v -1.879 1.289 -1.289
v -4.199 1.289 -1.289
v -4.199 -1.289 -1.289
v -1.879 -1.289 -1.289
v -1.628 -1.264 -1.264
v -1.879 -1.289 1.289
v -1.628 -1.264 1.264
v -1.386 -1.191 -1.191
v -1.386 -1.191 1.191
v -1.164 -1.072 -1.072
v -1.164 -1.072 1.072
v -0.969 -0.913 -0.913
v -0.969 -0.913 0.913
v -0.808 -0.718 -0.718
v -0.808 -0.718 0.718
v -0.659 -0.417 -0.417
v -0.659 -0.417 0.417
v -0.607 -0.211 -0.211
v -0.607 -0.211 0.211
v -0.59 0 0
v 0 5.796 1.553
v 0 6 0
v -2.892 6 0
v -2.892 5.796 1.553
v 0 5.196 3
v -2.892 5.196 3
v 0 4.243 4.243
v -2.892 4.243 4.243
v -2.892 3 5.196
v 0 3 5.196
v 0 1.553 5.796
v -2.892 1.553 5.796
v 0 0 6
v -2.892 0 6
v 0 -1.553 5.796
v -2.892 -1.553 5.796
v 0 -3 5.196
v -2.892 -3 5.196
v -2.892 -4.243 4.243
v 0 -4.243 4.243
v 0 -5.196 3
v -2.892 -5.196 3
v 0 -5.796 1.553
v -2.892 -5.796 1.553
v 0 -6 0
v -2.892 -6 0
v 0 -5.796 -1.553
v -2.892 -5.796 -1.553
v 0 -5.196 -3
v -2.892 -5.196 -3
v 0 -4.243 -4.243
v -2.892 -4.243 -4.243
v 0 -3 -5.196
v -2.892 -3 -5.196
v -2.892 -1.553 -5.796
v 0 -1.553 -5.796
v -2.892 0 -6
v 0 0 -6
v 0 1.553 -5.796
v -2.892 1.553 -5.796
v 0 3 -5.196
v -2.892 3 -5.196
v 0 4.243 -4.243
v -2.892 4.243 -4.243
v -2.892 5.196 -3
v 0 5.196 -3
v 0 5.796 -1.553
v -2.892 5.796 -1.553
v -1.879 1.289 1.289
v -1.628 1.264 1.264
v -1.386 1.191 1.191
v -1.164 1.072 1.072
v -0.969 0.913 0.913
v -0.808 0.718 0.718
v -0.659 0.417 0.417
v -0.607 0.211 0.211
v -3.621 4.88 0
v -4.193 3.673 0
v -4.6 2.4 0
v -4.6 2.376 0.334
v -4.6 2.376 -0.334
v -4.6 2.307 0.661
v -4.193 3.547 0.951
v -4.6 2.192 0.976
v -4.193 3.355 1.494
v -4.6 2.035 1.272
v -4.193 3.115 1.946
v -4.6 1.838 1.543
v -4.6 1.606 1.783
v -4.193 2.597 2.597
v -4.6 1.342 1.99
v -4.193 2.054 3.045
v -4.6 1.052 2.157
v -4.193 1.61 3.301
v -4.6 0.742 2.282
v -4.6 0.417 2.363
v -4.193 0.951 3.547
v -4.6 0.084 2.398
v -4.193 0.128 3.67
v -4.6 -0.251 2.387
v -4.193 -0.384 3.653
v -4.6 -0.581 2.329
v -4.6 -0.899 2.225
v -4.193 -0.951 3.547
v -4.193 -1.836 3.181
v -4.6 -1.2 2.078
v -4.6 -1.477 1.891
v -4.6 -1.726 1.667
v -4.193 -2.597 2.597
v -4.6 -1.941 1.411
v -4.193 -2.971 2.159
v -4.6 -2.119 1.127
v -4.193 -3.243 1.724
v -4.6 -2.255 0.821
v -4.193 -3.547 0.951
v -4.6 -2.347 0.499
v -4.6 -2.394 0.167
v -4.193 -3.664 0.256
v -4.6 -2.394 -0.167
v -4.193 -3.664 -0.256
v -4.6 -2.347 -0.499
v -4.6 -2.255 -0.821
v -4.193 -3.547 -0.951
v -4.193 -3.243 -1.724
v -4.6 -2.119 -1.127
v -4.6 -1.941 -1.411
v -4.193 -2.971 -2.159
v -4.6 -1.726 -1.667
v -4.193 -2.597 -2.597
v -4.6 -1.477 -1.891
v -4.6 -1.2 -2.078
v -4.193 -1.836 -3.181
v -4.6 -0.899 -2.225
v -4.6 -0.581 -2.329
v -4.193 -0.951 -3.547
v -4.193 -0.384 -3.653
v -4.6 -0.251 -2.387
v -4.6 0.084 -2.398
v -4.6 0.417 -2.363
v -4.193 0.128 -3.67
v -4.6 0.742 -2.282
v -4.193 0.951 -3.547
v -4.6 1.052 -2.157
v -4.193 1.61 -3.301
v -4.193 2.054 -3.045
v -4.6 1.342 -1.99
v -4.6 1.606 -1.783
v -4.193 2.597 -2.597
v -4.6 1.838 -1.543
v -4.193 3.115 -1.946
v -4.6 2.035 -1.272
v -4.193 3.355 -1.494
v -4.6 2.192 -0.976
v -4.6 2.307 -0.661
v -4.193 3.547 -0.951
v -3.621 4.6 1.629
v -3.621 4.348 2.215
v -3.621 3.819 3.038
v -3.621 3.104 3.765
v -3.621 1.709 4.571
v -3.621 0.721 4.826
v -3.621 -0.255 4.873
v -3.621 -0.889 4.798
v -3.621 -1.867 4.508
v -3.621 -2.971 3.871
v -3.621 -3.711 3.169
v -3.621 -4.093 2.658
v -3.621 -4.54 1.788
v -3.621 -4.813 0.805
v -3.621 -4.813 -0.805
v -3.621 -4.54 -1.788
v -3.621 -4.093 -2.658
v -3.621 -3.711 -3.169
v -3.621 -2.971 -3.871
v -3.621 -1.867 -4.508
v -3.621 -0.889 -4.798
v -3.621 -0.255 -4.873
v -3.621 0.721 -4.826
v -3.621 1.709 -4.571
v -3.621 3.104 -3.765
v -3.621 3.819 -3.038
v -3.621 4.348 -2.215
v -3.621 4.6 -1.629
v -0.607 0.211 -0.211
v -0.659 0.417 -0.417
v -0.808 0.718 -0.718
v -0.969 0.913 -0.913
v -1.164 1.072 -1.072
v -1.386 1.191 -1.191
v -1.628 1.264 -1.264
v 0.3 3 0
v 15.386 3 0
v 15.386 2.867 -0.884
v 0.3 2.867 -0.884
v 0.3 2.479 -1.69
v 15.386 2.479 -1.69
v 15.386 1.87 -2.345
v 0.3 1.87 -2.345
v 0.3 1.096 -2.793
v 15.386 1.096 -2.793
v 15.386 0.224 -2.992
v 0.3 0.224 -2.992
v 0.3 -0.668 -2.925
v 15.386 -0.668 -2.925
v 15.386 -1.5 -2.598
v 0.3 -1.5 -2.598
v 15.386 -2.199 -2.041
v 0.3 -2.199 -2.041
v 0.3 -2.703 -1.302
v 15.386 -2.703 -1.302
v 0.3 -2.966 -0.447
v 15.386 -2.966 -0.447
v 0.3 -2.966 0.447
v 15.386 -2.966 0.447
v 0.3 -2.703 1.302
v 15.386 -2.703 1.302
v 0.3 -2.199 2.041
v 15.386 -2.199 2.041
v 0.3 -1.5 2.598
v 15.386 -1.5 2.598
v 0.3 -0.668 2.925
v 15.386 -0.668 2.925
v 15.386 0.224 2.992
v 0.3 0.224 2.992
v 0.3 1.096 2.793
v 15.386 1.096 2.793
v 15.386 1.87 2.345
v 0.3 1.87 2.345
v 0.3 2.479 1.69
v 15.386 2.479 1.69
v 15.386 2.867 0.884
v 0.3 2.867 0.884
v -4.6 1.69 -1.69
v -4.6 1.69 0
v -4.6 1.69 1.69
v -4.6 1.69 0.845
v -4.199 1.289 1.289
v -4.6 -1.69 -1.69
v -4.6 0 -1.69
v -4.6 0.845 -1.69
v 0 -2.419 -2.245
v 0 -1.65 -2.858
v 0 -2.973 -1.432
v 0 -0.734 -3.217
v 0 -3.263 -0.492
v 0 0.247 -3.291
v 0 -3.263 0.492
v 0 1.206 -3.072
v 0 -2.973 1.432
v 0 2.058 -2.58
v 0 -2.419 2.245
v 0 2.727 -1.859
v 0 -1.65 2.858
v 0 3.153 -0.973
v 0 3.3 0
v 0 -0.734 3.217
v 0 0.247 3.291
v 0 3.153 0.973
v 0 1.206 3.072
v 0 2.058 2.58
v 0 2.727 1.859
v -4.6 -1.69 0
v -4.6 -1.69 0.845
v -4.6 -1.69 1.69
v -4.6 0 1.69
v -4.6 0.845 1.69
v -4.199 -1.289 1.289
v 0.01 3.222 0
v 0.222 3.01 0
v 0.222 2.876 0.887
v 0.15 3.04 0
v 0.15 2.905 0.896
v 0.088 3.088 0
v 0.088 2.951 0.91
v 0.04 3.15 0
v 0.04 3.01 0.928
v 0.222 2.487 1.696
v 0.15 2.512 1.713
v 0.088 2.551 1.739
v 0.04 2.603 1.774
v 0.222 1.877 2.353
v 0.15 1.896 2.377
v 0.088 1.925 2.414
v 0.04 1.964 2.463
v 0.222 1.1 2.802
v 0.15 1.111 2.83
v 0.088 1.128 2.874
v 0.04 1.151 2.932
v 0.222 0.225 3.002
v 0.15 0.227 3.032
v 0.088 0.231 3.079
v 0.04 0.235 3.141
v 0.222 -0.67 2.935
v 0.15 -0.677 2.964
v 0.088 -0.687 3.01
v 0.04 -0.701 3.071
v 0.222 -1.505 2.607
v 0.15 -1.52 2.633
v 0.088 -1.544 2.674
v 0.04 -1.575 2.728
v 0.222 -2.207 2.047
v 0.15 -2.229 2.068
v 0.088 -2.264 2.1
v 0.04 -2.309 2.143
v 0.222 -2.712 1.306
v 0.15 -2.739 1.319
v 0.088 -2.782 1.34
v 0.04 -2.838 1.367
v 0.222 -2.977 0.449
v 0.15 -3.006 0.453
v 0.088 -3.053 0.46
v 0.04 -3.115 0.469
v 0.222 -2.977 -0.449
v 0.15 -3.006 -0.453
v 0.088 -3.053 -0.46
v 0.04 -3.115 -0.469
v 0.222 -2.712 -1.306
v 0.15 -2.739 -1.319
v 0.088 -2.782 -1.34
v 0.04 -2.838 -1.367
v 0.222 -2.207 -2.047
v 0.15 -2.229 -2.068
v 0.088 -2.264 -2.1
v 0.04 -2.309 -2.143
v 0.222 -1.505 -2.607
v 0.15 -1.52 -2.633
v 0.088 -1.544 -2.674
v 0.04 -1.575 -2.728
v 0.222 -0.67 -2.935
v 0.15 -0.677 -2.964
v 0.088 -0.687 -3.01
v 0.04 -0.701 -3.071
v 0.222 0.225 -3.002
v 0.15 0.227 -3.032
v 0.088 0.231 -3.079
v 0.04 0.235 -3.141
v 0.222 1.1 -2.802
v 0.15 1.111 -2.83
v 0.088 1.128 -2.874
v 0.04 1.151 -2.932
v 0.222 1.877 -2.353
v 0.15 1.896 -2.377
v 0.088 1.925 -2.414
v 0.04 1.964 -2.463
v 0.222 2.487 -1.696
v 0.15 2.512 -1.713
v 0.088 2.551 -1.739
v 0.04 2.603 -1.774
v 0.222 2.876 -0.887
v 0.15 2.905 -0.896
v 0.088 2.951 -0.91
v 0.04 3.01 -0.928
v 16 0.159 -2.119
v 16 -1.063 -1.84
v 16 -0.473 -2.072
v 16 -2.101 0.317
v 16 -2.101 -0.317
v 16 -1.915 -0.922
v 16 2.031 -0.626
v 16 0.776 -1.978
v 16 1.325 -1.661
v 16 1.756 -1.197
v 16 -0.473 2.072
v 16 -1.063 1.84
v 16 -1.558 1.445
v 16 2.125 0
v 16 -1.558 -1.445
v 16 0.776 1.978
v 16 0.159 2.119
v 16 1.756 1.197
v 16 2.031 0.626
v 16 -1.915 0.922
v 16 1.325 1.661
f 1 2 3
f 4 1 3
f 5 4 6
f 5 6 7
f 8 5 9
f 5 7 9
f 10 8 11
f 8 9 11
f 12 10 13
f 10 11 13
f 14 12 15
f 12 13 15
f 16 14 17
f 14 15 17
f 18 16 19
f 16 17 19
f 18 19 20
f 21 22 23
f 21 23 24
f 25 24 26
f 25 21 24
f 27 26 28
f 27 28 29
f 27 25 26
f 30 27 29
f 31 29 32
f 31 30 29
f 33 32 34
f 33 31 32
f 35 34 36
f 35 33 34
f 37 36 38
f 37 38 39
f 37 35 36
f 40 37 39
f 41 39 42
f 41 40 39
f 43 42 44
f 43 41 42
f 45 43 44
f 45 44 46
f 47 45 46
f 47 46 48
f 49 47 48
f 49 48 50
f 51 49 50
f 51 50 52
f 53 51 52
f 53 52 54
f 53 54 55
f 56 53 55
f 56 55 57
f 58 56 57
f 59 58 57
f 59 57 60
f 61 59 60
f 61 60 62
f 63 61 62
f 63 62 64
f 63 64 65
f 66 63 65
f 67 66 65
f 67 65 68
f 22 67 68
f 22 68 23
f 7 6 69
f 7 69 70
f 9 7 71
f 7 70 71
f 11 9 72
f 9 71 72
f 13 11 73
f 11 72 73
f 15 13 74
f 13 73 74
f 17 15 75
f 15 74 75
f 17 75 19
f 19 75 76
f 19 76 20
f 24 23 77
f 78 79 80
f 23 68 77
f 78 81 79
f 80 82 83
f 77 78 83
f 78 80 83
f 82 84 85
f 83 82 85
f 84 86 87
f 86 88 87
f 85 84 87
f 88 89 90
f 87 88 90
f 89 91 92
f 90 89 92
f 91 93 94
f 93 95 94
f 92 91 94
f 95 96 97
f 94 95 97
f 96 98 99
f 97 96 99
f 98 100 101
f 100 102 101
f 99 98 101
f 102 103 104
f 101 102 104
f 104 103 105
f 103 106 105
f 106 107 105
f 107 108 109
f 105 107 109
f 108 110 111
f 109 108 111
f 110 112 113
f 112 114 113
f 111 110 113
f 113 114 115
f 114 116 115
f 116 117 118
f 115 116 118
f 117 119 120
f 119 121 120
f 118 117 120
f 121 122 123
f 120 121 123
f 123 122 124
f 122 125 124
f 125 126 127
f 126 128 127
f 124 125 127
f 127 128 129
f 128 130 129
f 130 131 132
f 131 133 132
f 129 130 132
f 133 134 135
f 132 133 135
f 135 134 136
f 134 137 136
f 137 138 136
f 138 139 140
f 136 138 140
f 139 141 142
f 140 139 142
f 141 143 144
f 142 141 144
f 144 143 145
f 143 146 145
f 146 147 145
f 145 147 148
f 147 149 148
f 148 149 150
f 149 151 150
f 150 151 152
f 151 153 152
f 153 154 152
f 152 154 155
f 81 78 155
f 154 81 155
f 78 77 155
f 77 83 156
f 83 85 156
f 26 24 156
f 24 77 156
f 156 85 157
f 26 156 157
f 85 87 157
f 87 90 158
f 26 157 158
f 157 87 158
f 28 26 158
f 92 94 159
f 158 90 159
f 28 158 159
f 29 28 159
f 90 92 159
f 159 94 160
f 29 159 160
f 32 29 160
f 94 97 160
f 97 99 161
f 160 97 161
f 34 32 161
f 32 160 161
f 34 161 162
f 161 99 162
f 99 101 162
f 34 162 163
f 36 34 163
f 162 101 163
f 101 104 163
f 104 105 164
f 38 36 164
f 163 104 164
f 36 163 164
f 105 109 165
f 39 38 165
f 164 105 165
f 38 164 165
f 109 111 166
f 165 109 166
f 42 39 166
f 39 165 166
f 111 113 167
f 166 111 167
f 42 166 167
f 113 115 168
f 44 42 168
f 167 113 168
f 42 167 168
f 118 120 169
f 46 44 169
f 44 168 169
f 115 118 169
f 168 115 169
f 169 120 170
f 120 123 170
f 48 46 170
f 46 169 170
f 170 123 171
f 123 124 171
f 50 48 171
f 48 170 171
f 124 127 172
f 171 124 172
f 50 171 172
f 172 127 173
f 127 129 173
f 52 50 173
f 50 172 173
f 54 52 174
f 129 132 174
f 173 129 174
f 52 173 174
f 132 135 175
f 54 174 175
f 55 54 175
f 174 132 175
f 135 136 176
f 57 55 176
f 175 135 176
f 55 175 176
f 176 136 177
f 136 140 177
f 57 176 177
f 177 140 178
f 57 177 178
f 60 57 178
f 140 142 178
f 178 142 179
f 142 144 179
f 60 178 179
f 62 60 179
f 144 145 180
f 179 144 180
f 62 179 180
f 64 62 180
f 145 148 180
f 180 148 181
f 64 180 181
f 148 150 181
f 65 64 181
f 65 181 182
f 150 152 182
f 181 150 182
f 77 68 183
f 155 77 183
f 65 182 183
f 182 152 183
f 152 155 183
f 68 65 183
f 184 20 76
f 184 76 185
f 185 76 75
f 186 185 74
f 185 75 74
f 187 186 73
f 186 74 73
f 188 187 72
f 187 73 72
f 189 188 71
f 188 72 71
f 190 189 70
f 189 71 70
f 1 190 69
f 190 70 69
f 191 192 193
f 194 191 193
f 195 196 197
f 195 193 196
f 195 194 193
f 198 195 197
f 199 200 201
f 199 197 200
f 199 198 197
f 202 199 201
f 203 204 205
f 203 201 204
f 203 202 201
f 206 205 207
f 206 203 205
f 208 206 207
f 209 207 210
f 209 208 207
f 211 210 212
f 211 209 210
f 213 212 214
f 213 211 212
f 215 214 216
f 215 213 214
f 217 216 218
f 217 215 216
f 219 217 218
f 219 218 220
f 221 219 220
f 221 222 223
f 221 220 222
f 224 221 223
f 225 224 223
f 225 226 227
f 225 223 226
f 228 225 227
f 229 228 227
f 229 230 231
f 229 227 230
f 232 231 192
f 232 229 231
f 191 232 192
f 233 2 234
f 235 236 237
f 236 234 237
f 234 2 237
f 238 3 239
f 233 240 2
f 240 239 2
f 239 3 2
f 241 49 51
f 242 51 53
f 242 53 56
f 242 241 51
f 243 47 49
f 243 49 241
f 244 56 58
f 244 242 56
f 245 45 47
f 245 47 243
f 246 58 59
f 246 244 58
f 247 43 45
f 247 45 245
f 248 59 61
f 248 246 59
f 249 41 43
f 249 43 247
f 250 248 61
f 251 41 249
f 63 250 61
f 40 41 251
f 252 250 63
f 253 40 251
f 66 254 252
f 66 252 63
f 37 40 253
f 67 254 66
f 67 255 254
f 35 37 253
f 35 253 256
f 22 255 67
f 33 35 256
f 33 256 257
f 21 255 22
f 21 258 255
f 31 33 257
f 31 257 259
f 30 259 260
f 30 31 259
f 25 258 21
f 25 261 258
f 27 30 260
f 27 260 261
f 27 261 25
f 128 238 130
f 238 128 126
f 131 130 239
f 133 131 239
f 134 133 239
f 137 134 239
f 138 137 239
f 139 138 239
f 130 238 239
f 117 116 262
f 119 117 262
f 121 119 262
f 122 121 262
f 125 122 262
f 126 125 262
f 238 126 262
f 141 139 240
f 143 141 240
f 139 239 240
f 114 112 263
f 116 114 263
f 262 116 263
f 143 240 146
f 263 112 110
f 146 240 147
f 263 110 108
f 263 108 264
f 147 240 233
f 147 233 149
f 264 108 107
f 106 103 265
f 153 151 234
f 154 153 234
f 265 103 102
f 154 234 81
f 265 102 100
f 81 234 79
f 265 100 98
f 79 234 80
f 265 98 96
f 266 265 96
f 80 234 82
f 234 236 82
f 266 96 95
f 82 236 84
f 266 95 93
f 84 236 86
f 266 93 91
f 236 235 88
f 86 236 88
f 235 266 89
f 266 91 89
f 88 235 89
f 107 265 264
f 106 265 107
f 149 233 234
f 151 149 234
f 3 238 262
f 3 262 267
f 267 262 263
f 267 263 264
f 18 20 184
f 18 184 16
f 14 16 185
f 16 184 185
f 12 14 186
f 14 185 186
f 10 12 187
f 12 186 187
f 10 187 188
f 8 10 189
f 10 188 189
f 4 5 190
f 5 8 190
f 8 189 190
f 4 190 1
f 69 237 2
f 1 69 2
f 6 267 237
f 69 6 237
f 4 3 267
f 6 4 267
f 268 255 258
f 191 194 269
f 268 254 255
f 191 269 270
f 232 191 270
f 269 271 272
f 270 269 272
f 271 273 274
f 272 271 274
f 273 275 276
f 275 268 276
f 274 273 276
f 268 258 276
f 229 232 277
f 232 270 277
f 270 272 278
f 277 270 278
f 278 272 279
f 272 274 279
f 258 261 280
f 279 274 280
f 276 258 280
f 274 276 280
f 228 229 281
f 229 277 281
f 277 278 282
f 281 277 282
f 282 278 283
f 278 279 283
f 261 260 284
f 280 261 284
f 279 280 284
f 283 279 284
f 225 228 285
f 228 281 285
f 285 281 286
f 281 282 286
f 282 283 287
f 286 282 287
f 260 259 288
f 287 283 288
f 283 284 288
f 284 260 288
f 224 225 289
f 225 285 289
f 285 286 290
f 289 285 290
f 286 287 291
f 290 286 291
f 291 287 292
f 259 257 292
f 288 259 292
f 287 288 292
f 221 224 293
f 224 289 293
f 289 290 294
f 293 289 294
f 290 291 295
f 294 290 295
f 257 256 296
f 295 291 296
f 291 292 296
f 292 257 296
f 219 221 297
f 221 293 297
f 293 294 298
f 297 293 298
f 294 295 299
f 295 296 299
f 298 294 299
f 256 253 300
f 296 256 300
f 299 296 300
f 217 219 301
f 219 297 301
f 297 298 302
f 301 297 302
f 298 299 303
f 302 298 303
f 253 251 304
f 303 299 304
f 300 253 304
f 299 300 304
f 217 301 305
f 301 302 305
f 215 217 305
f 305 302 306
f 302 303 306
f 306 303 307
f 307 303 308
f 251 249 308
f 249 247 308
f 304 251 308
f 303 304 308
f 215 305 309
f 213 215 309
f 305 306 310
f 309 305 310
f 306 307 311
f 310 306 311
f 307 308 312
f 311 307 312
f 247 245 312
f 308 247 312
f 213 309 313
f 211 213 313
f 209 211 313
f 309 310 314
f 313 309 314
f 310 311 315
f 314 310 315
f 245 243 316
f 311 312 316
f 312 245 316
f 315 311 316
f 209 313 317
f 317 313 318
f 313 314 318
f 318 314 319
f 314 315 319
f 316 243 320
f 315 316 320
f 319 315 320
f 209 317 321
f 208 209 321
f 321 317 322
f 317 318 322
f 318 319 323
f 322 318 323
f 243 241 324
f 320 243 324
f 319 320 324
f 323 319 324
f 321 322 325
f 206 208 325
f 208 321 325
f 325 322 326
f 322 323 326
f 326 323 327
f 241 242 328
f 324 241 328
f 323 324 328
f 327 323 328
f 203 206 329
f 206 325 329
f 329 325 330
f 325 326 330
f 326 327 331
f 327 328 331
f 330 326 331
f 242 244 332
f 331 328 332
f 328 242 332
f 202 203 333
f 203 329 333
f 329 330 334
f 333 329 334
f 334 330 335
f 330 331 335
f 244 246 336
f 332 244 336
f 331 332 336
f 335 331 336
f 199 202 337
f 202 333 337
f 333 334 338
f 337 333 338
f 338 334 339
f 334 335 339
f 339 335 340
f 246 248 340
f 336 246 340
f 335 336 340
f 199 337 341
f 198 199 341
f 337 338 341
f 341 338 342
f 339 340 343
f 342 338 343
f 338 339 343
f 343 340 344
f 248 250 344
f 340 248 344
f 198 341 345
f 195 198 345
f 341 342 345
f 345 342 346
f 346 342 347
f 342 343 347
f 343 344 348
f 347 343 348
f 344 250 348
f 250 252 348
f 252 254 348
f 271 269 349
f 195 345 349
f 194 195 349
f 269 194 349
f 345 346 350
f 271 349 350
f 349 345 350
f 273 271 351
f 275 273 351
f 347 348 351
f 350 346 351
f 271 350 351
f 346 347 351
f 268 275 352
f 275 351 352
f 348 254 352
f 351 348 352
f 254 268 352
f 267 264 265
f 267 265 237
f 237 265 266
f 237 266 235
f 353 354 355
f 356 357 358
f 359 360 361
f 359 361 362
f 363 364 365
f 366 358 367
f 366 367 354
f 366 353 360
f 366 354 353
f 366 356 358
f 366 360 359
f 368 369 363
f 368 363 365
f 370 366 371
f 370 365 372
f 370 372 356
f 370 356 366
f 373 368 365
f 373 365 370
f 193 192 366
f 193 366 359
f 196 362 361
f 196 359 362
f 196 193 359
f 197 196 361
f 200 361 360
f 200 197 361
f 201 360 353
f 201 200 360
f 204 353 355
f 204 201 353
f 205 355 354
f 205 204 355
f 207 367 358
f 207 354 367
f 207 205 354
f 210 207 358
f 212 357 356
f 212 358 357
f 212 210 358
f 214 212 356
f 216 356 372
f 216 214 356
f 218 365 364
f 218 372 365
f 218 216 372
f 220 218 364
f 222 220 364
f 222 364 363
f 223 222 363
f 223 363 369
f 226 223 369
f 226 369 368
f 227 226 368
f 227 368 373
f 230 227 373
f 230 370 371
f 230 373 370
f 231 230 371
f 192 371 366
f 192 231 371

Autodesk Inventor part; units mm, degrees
ref_plane "YZ Plane" through (0, 0, 0) normal (1, 0, 0) x (0, 1, 0)
sketch "Sketch1" plane through (0, 0, 0) normal (0, 0, 1) x (1, 0, 0)
  line L0 (-0.59, 0) -> (16, 0)
  line L1 (16, 0) -> (16, 3)
  line L2 (16, 3) -> (0, 3)
  line L3 (0, 3) -> (0, 6)
  line L4 (-9.3003, 0) -> (20.2167, 0) projected
  line L5 (0, -1.2172) -> (0, 7.3031) projected
  line L6 (-4.6, 2.3998) -> (-5.0836, 2.3998) construction
  line L7 (-4.6, 0) -> (-0.59, 0)
  line L8 (0, 0) -> (-0.59, 0)
  line L9 (-4.6, 0) -> (-4.6, 6)
  arc A0 (-2.8922, 6) -> (-4.6, 2.3998) centre (5.1078, 0) ccw
  line L10 (-4.6, 6) -> (0, 6)
  dimension "d0" = 16
  dimension "d1" = 6
  dimension "d2" = 12
  dimension "d4" = 4.7996
  dimension "d13" = 4.6
  dimension "d14" = 4.01
  dimension "d46" = 10
  dimension "d47" = 0
revolve "Body" add sketch "Sketch1" angle 360 about axis through (-0.59, 0, 0) along (1, 0, 0) contours L4 L9 A0 L10 L3 L5 L0 | L5 L2 L1 L0
ref_plane "IDS_WORKPLANE{1}" through (-4.6, 0, 0) normal (1, 0, 0) x (0, 0, -1)
sketch "Sketch2" plane through (-4.6, 0, 0) normal (1, 0, 0) x (0, 0, -1)
  line L0 (0, -8.4) -> (0, 8.4) projected
  line L1 (8.4, 0) -> (-8.4, 0) projected
  line L2 (-1.289, 1.289) -> (1.289, 1.289)
  line L3 (1.289, 1.289) -> (1.289, -1.289)
  line L4 (1.289, -1.289) -> (-1.289, -1.289)
  line L5 (-1.289, -1.289) -> (-1.289, 1.289)
  line L6 (0, 1.289) -> (0, -1.289) construction
  line L7 (-1.289, 0) -> (1.289, 0) construction
  dimension "d7" = 2.578
  dimension "d9" = 2.578
extrude "Extrusion" cut sketch "Sketch2" along normal blind 4.01
fillet "Fillet1" radius 1.289 4 edges at (-0.59, 0, -1.289) (-0.59, -1.289, 0) (-0.59, 0, 1.289) (-0.59, 1.289, 0)
chamfer "Chamfer1" distance 0.401 angle 45 4 edges at (-4.6, 1.289, 0) (-4.6, 0, -1.289) (-4.6, -1.289, 0) (-4.6, 0, 1.289)
thread "Thread" size "M6x1" class "6g" standard "ISO Metric profile" length 15
chamfer "Chamfer2" distance 0.875 distance2 0.6135 1 edges at (16, -3, 0) measured on face at (16, -1.1424, 0.935)
ref_plane "Work Plane2" through (69.85, 0, 0) normal (0, 0, -1) x (1, 0, 0)
fillet "Fillet2" radius 0.3 1 edges at (0, -3, 0)
equation "\"d0\" = NLG"
equation "\"d1\" = GD"
equation "\"d2\" = KOD"
equation "\"d4\" = 1.42 * KOM"
equation "\"d13\" = KOH"
equation "\"d14\" = STI"
equation "\"d46\" = KR"
equation "\"d7\" = KOM - 0.2 * STI"
equation "\"d9\" = KOM - 0.2 * STI"
equation "\"d48\" = STI"
equation "\"d50\" = -0.1 * STI + 0.5 * KOM"
equation "\"d51\" = 0.1 * STI"
equation "\"d18\" = GEL"
equation "\"d20\" = -0.5 * SPD + 0.5 * GD"
equation "\"d21\" = GUL"
equation "\"d44\" = R"
equation "\"GD\" = 6"
equation "\"NLG\" = 16"
equation "\"GEL\" = 15"
equation "\"KOD\" = 12"
equation "\"KOH\" = 4.6"
equation "\"SPD\" = 4.25"
equation "\"KR\" = 10"
equation "\"RR\" = 2"
equation "\"GUL\" = 0.61345 * PTC"
equation "\"KEWI\" = 0"
equation "\"SDM\" = 3.38"
equation "\"STI\" = 4.01"
equation "\"d6\" = -KOH"
equation "\"R\" = 0.3"
equation "\"KOM\" = 3.38"
equation "\"PTC\" = 1"
properties part number "ANSI B18.6.7M - M6x1 x 16, SRPHMSTIM" material "Steel, Mild"
